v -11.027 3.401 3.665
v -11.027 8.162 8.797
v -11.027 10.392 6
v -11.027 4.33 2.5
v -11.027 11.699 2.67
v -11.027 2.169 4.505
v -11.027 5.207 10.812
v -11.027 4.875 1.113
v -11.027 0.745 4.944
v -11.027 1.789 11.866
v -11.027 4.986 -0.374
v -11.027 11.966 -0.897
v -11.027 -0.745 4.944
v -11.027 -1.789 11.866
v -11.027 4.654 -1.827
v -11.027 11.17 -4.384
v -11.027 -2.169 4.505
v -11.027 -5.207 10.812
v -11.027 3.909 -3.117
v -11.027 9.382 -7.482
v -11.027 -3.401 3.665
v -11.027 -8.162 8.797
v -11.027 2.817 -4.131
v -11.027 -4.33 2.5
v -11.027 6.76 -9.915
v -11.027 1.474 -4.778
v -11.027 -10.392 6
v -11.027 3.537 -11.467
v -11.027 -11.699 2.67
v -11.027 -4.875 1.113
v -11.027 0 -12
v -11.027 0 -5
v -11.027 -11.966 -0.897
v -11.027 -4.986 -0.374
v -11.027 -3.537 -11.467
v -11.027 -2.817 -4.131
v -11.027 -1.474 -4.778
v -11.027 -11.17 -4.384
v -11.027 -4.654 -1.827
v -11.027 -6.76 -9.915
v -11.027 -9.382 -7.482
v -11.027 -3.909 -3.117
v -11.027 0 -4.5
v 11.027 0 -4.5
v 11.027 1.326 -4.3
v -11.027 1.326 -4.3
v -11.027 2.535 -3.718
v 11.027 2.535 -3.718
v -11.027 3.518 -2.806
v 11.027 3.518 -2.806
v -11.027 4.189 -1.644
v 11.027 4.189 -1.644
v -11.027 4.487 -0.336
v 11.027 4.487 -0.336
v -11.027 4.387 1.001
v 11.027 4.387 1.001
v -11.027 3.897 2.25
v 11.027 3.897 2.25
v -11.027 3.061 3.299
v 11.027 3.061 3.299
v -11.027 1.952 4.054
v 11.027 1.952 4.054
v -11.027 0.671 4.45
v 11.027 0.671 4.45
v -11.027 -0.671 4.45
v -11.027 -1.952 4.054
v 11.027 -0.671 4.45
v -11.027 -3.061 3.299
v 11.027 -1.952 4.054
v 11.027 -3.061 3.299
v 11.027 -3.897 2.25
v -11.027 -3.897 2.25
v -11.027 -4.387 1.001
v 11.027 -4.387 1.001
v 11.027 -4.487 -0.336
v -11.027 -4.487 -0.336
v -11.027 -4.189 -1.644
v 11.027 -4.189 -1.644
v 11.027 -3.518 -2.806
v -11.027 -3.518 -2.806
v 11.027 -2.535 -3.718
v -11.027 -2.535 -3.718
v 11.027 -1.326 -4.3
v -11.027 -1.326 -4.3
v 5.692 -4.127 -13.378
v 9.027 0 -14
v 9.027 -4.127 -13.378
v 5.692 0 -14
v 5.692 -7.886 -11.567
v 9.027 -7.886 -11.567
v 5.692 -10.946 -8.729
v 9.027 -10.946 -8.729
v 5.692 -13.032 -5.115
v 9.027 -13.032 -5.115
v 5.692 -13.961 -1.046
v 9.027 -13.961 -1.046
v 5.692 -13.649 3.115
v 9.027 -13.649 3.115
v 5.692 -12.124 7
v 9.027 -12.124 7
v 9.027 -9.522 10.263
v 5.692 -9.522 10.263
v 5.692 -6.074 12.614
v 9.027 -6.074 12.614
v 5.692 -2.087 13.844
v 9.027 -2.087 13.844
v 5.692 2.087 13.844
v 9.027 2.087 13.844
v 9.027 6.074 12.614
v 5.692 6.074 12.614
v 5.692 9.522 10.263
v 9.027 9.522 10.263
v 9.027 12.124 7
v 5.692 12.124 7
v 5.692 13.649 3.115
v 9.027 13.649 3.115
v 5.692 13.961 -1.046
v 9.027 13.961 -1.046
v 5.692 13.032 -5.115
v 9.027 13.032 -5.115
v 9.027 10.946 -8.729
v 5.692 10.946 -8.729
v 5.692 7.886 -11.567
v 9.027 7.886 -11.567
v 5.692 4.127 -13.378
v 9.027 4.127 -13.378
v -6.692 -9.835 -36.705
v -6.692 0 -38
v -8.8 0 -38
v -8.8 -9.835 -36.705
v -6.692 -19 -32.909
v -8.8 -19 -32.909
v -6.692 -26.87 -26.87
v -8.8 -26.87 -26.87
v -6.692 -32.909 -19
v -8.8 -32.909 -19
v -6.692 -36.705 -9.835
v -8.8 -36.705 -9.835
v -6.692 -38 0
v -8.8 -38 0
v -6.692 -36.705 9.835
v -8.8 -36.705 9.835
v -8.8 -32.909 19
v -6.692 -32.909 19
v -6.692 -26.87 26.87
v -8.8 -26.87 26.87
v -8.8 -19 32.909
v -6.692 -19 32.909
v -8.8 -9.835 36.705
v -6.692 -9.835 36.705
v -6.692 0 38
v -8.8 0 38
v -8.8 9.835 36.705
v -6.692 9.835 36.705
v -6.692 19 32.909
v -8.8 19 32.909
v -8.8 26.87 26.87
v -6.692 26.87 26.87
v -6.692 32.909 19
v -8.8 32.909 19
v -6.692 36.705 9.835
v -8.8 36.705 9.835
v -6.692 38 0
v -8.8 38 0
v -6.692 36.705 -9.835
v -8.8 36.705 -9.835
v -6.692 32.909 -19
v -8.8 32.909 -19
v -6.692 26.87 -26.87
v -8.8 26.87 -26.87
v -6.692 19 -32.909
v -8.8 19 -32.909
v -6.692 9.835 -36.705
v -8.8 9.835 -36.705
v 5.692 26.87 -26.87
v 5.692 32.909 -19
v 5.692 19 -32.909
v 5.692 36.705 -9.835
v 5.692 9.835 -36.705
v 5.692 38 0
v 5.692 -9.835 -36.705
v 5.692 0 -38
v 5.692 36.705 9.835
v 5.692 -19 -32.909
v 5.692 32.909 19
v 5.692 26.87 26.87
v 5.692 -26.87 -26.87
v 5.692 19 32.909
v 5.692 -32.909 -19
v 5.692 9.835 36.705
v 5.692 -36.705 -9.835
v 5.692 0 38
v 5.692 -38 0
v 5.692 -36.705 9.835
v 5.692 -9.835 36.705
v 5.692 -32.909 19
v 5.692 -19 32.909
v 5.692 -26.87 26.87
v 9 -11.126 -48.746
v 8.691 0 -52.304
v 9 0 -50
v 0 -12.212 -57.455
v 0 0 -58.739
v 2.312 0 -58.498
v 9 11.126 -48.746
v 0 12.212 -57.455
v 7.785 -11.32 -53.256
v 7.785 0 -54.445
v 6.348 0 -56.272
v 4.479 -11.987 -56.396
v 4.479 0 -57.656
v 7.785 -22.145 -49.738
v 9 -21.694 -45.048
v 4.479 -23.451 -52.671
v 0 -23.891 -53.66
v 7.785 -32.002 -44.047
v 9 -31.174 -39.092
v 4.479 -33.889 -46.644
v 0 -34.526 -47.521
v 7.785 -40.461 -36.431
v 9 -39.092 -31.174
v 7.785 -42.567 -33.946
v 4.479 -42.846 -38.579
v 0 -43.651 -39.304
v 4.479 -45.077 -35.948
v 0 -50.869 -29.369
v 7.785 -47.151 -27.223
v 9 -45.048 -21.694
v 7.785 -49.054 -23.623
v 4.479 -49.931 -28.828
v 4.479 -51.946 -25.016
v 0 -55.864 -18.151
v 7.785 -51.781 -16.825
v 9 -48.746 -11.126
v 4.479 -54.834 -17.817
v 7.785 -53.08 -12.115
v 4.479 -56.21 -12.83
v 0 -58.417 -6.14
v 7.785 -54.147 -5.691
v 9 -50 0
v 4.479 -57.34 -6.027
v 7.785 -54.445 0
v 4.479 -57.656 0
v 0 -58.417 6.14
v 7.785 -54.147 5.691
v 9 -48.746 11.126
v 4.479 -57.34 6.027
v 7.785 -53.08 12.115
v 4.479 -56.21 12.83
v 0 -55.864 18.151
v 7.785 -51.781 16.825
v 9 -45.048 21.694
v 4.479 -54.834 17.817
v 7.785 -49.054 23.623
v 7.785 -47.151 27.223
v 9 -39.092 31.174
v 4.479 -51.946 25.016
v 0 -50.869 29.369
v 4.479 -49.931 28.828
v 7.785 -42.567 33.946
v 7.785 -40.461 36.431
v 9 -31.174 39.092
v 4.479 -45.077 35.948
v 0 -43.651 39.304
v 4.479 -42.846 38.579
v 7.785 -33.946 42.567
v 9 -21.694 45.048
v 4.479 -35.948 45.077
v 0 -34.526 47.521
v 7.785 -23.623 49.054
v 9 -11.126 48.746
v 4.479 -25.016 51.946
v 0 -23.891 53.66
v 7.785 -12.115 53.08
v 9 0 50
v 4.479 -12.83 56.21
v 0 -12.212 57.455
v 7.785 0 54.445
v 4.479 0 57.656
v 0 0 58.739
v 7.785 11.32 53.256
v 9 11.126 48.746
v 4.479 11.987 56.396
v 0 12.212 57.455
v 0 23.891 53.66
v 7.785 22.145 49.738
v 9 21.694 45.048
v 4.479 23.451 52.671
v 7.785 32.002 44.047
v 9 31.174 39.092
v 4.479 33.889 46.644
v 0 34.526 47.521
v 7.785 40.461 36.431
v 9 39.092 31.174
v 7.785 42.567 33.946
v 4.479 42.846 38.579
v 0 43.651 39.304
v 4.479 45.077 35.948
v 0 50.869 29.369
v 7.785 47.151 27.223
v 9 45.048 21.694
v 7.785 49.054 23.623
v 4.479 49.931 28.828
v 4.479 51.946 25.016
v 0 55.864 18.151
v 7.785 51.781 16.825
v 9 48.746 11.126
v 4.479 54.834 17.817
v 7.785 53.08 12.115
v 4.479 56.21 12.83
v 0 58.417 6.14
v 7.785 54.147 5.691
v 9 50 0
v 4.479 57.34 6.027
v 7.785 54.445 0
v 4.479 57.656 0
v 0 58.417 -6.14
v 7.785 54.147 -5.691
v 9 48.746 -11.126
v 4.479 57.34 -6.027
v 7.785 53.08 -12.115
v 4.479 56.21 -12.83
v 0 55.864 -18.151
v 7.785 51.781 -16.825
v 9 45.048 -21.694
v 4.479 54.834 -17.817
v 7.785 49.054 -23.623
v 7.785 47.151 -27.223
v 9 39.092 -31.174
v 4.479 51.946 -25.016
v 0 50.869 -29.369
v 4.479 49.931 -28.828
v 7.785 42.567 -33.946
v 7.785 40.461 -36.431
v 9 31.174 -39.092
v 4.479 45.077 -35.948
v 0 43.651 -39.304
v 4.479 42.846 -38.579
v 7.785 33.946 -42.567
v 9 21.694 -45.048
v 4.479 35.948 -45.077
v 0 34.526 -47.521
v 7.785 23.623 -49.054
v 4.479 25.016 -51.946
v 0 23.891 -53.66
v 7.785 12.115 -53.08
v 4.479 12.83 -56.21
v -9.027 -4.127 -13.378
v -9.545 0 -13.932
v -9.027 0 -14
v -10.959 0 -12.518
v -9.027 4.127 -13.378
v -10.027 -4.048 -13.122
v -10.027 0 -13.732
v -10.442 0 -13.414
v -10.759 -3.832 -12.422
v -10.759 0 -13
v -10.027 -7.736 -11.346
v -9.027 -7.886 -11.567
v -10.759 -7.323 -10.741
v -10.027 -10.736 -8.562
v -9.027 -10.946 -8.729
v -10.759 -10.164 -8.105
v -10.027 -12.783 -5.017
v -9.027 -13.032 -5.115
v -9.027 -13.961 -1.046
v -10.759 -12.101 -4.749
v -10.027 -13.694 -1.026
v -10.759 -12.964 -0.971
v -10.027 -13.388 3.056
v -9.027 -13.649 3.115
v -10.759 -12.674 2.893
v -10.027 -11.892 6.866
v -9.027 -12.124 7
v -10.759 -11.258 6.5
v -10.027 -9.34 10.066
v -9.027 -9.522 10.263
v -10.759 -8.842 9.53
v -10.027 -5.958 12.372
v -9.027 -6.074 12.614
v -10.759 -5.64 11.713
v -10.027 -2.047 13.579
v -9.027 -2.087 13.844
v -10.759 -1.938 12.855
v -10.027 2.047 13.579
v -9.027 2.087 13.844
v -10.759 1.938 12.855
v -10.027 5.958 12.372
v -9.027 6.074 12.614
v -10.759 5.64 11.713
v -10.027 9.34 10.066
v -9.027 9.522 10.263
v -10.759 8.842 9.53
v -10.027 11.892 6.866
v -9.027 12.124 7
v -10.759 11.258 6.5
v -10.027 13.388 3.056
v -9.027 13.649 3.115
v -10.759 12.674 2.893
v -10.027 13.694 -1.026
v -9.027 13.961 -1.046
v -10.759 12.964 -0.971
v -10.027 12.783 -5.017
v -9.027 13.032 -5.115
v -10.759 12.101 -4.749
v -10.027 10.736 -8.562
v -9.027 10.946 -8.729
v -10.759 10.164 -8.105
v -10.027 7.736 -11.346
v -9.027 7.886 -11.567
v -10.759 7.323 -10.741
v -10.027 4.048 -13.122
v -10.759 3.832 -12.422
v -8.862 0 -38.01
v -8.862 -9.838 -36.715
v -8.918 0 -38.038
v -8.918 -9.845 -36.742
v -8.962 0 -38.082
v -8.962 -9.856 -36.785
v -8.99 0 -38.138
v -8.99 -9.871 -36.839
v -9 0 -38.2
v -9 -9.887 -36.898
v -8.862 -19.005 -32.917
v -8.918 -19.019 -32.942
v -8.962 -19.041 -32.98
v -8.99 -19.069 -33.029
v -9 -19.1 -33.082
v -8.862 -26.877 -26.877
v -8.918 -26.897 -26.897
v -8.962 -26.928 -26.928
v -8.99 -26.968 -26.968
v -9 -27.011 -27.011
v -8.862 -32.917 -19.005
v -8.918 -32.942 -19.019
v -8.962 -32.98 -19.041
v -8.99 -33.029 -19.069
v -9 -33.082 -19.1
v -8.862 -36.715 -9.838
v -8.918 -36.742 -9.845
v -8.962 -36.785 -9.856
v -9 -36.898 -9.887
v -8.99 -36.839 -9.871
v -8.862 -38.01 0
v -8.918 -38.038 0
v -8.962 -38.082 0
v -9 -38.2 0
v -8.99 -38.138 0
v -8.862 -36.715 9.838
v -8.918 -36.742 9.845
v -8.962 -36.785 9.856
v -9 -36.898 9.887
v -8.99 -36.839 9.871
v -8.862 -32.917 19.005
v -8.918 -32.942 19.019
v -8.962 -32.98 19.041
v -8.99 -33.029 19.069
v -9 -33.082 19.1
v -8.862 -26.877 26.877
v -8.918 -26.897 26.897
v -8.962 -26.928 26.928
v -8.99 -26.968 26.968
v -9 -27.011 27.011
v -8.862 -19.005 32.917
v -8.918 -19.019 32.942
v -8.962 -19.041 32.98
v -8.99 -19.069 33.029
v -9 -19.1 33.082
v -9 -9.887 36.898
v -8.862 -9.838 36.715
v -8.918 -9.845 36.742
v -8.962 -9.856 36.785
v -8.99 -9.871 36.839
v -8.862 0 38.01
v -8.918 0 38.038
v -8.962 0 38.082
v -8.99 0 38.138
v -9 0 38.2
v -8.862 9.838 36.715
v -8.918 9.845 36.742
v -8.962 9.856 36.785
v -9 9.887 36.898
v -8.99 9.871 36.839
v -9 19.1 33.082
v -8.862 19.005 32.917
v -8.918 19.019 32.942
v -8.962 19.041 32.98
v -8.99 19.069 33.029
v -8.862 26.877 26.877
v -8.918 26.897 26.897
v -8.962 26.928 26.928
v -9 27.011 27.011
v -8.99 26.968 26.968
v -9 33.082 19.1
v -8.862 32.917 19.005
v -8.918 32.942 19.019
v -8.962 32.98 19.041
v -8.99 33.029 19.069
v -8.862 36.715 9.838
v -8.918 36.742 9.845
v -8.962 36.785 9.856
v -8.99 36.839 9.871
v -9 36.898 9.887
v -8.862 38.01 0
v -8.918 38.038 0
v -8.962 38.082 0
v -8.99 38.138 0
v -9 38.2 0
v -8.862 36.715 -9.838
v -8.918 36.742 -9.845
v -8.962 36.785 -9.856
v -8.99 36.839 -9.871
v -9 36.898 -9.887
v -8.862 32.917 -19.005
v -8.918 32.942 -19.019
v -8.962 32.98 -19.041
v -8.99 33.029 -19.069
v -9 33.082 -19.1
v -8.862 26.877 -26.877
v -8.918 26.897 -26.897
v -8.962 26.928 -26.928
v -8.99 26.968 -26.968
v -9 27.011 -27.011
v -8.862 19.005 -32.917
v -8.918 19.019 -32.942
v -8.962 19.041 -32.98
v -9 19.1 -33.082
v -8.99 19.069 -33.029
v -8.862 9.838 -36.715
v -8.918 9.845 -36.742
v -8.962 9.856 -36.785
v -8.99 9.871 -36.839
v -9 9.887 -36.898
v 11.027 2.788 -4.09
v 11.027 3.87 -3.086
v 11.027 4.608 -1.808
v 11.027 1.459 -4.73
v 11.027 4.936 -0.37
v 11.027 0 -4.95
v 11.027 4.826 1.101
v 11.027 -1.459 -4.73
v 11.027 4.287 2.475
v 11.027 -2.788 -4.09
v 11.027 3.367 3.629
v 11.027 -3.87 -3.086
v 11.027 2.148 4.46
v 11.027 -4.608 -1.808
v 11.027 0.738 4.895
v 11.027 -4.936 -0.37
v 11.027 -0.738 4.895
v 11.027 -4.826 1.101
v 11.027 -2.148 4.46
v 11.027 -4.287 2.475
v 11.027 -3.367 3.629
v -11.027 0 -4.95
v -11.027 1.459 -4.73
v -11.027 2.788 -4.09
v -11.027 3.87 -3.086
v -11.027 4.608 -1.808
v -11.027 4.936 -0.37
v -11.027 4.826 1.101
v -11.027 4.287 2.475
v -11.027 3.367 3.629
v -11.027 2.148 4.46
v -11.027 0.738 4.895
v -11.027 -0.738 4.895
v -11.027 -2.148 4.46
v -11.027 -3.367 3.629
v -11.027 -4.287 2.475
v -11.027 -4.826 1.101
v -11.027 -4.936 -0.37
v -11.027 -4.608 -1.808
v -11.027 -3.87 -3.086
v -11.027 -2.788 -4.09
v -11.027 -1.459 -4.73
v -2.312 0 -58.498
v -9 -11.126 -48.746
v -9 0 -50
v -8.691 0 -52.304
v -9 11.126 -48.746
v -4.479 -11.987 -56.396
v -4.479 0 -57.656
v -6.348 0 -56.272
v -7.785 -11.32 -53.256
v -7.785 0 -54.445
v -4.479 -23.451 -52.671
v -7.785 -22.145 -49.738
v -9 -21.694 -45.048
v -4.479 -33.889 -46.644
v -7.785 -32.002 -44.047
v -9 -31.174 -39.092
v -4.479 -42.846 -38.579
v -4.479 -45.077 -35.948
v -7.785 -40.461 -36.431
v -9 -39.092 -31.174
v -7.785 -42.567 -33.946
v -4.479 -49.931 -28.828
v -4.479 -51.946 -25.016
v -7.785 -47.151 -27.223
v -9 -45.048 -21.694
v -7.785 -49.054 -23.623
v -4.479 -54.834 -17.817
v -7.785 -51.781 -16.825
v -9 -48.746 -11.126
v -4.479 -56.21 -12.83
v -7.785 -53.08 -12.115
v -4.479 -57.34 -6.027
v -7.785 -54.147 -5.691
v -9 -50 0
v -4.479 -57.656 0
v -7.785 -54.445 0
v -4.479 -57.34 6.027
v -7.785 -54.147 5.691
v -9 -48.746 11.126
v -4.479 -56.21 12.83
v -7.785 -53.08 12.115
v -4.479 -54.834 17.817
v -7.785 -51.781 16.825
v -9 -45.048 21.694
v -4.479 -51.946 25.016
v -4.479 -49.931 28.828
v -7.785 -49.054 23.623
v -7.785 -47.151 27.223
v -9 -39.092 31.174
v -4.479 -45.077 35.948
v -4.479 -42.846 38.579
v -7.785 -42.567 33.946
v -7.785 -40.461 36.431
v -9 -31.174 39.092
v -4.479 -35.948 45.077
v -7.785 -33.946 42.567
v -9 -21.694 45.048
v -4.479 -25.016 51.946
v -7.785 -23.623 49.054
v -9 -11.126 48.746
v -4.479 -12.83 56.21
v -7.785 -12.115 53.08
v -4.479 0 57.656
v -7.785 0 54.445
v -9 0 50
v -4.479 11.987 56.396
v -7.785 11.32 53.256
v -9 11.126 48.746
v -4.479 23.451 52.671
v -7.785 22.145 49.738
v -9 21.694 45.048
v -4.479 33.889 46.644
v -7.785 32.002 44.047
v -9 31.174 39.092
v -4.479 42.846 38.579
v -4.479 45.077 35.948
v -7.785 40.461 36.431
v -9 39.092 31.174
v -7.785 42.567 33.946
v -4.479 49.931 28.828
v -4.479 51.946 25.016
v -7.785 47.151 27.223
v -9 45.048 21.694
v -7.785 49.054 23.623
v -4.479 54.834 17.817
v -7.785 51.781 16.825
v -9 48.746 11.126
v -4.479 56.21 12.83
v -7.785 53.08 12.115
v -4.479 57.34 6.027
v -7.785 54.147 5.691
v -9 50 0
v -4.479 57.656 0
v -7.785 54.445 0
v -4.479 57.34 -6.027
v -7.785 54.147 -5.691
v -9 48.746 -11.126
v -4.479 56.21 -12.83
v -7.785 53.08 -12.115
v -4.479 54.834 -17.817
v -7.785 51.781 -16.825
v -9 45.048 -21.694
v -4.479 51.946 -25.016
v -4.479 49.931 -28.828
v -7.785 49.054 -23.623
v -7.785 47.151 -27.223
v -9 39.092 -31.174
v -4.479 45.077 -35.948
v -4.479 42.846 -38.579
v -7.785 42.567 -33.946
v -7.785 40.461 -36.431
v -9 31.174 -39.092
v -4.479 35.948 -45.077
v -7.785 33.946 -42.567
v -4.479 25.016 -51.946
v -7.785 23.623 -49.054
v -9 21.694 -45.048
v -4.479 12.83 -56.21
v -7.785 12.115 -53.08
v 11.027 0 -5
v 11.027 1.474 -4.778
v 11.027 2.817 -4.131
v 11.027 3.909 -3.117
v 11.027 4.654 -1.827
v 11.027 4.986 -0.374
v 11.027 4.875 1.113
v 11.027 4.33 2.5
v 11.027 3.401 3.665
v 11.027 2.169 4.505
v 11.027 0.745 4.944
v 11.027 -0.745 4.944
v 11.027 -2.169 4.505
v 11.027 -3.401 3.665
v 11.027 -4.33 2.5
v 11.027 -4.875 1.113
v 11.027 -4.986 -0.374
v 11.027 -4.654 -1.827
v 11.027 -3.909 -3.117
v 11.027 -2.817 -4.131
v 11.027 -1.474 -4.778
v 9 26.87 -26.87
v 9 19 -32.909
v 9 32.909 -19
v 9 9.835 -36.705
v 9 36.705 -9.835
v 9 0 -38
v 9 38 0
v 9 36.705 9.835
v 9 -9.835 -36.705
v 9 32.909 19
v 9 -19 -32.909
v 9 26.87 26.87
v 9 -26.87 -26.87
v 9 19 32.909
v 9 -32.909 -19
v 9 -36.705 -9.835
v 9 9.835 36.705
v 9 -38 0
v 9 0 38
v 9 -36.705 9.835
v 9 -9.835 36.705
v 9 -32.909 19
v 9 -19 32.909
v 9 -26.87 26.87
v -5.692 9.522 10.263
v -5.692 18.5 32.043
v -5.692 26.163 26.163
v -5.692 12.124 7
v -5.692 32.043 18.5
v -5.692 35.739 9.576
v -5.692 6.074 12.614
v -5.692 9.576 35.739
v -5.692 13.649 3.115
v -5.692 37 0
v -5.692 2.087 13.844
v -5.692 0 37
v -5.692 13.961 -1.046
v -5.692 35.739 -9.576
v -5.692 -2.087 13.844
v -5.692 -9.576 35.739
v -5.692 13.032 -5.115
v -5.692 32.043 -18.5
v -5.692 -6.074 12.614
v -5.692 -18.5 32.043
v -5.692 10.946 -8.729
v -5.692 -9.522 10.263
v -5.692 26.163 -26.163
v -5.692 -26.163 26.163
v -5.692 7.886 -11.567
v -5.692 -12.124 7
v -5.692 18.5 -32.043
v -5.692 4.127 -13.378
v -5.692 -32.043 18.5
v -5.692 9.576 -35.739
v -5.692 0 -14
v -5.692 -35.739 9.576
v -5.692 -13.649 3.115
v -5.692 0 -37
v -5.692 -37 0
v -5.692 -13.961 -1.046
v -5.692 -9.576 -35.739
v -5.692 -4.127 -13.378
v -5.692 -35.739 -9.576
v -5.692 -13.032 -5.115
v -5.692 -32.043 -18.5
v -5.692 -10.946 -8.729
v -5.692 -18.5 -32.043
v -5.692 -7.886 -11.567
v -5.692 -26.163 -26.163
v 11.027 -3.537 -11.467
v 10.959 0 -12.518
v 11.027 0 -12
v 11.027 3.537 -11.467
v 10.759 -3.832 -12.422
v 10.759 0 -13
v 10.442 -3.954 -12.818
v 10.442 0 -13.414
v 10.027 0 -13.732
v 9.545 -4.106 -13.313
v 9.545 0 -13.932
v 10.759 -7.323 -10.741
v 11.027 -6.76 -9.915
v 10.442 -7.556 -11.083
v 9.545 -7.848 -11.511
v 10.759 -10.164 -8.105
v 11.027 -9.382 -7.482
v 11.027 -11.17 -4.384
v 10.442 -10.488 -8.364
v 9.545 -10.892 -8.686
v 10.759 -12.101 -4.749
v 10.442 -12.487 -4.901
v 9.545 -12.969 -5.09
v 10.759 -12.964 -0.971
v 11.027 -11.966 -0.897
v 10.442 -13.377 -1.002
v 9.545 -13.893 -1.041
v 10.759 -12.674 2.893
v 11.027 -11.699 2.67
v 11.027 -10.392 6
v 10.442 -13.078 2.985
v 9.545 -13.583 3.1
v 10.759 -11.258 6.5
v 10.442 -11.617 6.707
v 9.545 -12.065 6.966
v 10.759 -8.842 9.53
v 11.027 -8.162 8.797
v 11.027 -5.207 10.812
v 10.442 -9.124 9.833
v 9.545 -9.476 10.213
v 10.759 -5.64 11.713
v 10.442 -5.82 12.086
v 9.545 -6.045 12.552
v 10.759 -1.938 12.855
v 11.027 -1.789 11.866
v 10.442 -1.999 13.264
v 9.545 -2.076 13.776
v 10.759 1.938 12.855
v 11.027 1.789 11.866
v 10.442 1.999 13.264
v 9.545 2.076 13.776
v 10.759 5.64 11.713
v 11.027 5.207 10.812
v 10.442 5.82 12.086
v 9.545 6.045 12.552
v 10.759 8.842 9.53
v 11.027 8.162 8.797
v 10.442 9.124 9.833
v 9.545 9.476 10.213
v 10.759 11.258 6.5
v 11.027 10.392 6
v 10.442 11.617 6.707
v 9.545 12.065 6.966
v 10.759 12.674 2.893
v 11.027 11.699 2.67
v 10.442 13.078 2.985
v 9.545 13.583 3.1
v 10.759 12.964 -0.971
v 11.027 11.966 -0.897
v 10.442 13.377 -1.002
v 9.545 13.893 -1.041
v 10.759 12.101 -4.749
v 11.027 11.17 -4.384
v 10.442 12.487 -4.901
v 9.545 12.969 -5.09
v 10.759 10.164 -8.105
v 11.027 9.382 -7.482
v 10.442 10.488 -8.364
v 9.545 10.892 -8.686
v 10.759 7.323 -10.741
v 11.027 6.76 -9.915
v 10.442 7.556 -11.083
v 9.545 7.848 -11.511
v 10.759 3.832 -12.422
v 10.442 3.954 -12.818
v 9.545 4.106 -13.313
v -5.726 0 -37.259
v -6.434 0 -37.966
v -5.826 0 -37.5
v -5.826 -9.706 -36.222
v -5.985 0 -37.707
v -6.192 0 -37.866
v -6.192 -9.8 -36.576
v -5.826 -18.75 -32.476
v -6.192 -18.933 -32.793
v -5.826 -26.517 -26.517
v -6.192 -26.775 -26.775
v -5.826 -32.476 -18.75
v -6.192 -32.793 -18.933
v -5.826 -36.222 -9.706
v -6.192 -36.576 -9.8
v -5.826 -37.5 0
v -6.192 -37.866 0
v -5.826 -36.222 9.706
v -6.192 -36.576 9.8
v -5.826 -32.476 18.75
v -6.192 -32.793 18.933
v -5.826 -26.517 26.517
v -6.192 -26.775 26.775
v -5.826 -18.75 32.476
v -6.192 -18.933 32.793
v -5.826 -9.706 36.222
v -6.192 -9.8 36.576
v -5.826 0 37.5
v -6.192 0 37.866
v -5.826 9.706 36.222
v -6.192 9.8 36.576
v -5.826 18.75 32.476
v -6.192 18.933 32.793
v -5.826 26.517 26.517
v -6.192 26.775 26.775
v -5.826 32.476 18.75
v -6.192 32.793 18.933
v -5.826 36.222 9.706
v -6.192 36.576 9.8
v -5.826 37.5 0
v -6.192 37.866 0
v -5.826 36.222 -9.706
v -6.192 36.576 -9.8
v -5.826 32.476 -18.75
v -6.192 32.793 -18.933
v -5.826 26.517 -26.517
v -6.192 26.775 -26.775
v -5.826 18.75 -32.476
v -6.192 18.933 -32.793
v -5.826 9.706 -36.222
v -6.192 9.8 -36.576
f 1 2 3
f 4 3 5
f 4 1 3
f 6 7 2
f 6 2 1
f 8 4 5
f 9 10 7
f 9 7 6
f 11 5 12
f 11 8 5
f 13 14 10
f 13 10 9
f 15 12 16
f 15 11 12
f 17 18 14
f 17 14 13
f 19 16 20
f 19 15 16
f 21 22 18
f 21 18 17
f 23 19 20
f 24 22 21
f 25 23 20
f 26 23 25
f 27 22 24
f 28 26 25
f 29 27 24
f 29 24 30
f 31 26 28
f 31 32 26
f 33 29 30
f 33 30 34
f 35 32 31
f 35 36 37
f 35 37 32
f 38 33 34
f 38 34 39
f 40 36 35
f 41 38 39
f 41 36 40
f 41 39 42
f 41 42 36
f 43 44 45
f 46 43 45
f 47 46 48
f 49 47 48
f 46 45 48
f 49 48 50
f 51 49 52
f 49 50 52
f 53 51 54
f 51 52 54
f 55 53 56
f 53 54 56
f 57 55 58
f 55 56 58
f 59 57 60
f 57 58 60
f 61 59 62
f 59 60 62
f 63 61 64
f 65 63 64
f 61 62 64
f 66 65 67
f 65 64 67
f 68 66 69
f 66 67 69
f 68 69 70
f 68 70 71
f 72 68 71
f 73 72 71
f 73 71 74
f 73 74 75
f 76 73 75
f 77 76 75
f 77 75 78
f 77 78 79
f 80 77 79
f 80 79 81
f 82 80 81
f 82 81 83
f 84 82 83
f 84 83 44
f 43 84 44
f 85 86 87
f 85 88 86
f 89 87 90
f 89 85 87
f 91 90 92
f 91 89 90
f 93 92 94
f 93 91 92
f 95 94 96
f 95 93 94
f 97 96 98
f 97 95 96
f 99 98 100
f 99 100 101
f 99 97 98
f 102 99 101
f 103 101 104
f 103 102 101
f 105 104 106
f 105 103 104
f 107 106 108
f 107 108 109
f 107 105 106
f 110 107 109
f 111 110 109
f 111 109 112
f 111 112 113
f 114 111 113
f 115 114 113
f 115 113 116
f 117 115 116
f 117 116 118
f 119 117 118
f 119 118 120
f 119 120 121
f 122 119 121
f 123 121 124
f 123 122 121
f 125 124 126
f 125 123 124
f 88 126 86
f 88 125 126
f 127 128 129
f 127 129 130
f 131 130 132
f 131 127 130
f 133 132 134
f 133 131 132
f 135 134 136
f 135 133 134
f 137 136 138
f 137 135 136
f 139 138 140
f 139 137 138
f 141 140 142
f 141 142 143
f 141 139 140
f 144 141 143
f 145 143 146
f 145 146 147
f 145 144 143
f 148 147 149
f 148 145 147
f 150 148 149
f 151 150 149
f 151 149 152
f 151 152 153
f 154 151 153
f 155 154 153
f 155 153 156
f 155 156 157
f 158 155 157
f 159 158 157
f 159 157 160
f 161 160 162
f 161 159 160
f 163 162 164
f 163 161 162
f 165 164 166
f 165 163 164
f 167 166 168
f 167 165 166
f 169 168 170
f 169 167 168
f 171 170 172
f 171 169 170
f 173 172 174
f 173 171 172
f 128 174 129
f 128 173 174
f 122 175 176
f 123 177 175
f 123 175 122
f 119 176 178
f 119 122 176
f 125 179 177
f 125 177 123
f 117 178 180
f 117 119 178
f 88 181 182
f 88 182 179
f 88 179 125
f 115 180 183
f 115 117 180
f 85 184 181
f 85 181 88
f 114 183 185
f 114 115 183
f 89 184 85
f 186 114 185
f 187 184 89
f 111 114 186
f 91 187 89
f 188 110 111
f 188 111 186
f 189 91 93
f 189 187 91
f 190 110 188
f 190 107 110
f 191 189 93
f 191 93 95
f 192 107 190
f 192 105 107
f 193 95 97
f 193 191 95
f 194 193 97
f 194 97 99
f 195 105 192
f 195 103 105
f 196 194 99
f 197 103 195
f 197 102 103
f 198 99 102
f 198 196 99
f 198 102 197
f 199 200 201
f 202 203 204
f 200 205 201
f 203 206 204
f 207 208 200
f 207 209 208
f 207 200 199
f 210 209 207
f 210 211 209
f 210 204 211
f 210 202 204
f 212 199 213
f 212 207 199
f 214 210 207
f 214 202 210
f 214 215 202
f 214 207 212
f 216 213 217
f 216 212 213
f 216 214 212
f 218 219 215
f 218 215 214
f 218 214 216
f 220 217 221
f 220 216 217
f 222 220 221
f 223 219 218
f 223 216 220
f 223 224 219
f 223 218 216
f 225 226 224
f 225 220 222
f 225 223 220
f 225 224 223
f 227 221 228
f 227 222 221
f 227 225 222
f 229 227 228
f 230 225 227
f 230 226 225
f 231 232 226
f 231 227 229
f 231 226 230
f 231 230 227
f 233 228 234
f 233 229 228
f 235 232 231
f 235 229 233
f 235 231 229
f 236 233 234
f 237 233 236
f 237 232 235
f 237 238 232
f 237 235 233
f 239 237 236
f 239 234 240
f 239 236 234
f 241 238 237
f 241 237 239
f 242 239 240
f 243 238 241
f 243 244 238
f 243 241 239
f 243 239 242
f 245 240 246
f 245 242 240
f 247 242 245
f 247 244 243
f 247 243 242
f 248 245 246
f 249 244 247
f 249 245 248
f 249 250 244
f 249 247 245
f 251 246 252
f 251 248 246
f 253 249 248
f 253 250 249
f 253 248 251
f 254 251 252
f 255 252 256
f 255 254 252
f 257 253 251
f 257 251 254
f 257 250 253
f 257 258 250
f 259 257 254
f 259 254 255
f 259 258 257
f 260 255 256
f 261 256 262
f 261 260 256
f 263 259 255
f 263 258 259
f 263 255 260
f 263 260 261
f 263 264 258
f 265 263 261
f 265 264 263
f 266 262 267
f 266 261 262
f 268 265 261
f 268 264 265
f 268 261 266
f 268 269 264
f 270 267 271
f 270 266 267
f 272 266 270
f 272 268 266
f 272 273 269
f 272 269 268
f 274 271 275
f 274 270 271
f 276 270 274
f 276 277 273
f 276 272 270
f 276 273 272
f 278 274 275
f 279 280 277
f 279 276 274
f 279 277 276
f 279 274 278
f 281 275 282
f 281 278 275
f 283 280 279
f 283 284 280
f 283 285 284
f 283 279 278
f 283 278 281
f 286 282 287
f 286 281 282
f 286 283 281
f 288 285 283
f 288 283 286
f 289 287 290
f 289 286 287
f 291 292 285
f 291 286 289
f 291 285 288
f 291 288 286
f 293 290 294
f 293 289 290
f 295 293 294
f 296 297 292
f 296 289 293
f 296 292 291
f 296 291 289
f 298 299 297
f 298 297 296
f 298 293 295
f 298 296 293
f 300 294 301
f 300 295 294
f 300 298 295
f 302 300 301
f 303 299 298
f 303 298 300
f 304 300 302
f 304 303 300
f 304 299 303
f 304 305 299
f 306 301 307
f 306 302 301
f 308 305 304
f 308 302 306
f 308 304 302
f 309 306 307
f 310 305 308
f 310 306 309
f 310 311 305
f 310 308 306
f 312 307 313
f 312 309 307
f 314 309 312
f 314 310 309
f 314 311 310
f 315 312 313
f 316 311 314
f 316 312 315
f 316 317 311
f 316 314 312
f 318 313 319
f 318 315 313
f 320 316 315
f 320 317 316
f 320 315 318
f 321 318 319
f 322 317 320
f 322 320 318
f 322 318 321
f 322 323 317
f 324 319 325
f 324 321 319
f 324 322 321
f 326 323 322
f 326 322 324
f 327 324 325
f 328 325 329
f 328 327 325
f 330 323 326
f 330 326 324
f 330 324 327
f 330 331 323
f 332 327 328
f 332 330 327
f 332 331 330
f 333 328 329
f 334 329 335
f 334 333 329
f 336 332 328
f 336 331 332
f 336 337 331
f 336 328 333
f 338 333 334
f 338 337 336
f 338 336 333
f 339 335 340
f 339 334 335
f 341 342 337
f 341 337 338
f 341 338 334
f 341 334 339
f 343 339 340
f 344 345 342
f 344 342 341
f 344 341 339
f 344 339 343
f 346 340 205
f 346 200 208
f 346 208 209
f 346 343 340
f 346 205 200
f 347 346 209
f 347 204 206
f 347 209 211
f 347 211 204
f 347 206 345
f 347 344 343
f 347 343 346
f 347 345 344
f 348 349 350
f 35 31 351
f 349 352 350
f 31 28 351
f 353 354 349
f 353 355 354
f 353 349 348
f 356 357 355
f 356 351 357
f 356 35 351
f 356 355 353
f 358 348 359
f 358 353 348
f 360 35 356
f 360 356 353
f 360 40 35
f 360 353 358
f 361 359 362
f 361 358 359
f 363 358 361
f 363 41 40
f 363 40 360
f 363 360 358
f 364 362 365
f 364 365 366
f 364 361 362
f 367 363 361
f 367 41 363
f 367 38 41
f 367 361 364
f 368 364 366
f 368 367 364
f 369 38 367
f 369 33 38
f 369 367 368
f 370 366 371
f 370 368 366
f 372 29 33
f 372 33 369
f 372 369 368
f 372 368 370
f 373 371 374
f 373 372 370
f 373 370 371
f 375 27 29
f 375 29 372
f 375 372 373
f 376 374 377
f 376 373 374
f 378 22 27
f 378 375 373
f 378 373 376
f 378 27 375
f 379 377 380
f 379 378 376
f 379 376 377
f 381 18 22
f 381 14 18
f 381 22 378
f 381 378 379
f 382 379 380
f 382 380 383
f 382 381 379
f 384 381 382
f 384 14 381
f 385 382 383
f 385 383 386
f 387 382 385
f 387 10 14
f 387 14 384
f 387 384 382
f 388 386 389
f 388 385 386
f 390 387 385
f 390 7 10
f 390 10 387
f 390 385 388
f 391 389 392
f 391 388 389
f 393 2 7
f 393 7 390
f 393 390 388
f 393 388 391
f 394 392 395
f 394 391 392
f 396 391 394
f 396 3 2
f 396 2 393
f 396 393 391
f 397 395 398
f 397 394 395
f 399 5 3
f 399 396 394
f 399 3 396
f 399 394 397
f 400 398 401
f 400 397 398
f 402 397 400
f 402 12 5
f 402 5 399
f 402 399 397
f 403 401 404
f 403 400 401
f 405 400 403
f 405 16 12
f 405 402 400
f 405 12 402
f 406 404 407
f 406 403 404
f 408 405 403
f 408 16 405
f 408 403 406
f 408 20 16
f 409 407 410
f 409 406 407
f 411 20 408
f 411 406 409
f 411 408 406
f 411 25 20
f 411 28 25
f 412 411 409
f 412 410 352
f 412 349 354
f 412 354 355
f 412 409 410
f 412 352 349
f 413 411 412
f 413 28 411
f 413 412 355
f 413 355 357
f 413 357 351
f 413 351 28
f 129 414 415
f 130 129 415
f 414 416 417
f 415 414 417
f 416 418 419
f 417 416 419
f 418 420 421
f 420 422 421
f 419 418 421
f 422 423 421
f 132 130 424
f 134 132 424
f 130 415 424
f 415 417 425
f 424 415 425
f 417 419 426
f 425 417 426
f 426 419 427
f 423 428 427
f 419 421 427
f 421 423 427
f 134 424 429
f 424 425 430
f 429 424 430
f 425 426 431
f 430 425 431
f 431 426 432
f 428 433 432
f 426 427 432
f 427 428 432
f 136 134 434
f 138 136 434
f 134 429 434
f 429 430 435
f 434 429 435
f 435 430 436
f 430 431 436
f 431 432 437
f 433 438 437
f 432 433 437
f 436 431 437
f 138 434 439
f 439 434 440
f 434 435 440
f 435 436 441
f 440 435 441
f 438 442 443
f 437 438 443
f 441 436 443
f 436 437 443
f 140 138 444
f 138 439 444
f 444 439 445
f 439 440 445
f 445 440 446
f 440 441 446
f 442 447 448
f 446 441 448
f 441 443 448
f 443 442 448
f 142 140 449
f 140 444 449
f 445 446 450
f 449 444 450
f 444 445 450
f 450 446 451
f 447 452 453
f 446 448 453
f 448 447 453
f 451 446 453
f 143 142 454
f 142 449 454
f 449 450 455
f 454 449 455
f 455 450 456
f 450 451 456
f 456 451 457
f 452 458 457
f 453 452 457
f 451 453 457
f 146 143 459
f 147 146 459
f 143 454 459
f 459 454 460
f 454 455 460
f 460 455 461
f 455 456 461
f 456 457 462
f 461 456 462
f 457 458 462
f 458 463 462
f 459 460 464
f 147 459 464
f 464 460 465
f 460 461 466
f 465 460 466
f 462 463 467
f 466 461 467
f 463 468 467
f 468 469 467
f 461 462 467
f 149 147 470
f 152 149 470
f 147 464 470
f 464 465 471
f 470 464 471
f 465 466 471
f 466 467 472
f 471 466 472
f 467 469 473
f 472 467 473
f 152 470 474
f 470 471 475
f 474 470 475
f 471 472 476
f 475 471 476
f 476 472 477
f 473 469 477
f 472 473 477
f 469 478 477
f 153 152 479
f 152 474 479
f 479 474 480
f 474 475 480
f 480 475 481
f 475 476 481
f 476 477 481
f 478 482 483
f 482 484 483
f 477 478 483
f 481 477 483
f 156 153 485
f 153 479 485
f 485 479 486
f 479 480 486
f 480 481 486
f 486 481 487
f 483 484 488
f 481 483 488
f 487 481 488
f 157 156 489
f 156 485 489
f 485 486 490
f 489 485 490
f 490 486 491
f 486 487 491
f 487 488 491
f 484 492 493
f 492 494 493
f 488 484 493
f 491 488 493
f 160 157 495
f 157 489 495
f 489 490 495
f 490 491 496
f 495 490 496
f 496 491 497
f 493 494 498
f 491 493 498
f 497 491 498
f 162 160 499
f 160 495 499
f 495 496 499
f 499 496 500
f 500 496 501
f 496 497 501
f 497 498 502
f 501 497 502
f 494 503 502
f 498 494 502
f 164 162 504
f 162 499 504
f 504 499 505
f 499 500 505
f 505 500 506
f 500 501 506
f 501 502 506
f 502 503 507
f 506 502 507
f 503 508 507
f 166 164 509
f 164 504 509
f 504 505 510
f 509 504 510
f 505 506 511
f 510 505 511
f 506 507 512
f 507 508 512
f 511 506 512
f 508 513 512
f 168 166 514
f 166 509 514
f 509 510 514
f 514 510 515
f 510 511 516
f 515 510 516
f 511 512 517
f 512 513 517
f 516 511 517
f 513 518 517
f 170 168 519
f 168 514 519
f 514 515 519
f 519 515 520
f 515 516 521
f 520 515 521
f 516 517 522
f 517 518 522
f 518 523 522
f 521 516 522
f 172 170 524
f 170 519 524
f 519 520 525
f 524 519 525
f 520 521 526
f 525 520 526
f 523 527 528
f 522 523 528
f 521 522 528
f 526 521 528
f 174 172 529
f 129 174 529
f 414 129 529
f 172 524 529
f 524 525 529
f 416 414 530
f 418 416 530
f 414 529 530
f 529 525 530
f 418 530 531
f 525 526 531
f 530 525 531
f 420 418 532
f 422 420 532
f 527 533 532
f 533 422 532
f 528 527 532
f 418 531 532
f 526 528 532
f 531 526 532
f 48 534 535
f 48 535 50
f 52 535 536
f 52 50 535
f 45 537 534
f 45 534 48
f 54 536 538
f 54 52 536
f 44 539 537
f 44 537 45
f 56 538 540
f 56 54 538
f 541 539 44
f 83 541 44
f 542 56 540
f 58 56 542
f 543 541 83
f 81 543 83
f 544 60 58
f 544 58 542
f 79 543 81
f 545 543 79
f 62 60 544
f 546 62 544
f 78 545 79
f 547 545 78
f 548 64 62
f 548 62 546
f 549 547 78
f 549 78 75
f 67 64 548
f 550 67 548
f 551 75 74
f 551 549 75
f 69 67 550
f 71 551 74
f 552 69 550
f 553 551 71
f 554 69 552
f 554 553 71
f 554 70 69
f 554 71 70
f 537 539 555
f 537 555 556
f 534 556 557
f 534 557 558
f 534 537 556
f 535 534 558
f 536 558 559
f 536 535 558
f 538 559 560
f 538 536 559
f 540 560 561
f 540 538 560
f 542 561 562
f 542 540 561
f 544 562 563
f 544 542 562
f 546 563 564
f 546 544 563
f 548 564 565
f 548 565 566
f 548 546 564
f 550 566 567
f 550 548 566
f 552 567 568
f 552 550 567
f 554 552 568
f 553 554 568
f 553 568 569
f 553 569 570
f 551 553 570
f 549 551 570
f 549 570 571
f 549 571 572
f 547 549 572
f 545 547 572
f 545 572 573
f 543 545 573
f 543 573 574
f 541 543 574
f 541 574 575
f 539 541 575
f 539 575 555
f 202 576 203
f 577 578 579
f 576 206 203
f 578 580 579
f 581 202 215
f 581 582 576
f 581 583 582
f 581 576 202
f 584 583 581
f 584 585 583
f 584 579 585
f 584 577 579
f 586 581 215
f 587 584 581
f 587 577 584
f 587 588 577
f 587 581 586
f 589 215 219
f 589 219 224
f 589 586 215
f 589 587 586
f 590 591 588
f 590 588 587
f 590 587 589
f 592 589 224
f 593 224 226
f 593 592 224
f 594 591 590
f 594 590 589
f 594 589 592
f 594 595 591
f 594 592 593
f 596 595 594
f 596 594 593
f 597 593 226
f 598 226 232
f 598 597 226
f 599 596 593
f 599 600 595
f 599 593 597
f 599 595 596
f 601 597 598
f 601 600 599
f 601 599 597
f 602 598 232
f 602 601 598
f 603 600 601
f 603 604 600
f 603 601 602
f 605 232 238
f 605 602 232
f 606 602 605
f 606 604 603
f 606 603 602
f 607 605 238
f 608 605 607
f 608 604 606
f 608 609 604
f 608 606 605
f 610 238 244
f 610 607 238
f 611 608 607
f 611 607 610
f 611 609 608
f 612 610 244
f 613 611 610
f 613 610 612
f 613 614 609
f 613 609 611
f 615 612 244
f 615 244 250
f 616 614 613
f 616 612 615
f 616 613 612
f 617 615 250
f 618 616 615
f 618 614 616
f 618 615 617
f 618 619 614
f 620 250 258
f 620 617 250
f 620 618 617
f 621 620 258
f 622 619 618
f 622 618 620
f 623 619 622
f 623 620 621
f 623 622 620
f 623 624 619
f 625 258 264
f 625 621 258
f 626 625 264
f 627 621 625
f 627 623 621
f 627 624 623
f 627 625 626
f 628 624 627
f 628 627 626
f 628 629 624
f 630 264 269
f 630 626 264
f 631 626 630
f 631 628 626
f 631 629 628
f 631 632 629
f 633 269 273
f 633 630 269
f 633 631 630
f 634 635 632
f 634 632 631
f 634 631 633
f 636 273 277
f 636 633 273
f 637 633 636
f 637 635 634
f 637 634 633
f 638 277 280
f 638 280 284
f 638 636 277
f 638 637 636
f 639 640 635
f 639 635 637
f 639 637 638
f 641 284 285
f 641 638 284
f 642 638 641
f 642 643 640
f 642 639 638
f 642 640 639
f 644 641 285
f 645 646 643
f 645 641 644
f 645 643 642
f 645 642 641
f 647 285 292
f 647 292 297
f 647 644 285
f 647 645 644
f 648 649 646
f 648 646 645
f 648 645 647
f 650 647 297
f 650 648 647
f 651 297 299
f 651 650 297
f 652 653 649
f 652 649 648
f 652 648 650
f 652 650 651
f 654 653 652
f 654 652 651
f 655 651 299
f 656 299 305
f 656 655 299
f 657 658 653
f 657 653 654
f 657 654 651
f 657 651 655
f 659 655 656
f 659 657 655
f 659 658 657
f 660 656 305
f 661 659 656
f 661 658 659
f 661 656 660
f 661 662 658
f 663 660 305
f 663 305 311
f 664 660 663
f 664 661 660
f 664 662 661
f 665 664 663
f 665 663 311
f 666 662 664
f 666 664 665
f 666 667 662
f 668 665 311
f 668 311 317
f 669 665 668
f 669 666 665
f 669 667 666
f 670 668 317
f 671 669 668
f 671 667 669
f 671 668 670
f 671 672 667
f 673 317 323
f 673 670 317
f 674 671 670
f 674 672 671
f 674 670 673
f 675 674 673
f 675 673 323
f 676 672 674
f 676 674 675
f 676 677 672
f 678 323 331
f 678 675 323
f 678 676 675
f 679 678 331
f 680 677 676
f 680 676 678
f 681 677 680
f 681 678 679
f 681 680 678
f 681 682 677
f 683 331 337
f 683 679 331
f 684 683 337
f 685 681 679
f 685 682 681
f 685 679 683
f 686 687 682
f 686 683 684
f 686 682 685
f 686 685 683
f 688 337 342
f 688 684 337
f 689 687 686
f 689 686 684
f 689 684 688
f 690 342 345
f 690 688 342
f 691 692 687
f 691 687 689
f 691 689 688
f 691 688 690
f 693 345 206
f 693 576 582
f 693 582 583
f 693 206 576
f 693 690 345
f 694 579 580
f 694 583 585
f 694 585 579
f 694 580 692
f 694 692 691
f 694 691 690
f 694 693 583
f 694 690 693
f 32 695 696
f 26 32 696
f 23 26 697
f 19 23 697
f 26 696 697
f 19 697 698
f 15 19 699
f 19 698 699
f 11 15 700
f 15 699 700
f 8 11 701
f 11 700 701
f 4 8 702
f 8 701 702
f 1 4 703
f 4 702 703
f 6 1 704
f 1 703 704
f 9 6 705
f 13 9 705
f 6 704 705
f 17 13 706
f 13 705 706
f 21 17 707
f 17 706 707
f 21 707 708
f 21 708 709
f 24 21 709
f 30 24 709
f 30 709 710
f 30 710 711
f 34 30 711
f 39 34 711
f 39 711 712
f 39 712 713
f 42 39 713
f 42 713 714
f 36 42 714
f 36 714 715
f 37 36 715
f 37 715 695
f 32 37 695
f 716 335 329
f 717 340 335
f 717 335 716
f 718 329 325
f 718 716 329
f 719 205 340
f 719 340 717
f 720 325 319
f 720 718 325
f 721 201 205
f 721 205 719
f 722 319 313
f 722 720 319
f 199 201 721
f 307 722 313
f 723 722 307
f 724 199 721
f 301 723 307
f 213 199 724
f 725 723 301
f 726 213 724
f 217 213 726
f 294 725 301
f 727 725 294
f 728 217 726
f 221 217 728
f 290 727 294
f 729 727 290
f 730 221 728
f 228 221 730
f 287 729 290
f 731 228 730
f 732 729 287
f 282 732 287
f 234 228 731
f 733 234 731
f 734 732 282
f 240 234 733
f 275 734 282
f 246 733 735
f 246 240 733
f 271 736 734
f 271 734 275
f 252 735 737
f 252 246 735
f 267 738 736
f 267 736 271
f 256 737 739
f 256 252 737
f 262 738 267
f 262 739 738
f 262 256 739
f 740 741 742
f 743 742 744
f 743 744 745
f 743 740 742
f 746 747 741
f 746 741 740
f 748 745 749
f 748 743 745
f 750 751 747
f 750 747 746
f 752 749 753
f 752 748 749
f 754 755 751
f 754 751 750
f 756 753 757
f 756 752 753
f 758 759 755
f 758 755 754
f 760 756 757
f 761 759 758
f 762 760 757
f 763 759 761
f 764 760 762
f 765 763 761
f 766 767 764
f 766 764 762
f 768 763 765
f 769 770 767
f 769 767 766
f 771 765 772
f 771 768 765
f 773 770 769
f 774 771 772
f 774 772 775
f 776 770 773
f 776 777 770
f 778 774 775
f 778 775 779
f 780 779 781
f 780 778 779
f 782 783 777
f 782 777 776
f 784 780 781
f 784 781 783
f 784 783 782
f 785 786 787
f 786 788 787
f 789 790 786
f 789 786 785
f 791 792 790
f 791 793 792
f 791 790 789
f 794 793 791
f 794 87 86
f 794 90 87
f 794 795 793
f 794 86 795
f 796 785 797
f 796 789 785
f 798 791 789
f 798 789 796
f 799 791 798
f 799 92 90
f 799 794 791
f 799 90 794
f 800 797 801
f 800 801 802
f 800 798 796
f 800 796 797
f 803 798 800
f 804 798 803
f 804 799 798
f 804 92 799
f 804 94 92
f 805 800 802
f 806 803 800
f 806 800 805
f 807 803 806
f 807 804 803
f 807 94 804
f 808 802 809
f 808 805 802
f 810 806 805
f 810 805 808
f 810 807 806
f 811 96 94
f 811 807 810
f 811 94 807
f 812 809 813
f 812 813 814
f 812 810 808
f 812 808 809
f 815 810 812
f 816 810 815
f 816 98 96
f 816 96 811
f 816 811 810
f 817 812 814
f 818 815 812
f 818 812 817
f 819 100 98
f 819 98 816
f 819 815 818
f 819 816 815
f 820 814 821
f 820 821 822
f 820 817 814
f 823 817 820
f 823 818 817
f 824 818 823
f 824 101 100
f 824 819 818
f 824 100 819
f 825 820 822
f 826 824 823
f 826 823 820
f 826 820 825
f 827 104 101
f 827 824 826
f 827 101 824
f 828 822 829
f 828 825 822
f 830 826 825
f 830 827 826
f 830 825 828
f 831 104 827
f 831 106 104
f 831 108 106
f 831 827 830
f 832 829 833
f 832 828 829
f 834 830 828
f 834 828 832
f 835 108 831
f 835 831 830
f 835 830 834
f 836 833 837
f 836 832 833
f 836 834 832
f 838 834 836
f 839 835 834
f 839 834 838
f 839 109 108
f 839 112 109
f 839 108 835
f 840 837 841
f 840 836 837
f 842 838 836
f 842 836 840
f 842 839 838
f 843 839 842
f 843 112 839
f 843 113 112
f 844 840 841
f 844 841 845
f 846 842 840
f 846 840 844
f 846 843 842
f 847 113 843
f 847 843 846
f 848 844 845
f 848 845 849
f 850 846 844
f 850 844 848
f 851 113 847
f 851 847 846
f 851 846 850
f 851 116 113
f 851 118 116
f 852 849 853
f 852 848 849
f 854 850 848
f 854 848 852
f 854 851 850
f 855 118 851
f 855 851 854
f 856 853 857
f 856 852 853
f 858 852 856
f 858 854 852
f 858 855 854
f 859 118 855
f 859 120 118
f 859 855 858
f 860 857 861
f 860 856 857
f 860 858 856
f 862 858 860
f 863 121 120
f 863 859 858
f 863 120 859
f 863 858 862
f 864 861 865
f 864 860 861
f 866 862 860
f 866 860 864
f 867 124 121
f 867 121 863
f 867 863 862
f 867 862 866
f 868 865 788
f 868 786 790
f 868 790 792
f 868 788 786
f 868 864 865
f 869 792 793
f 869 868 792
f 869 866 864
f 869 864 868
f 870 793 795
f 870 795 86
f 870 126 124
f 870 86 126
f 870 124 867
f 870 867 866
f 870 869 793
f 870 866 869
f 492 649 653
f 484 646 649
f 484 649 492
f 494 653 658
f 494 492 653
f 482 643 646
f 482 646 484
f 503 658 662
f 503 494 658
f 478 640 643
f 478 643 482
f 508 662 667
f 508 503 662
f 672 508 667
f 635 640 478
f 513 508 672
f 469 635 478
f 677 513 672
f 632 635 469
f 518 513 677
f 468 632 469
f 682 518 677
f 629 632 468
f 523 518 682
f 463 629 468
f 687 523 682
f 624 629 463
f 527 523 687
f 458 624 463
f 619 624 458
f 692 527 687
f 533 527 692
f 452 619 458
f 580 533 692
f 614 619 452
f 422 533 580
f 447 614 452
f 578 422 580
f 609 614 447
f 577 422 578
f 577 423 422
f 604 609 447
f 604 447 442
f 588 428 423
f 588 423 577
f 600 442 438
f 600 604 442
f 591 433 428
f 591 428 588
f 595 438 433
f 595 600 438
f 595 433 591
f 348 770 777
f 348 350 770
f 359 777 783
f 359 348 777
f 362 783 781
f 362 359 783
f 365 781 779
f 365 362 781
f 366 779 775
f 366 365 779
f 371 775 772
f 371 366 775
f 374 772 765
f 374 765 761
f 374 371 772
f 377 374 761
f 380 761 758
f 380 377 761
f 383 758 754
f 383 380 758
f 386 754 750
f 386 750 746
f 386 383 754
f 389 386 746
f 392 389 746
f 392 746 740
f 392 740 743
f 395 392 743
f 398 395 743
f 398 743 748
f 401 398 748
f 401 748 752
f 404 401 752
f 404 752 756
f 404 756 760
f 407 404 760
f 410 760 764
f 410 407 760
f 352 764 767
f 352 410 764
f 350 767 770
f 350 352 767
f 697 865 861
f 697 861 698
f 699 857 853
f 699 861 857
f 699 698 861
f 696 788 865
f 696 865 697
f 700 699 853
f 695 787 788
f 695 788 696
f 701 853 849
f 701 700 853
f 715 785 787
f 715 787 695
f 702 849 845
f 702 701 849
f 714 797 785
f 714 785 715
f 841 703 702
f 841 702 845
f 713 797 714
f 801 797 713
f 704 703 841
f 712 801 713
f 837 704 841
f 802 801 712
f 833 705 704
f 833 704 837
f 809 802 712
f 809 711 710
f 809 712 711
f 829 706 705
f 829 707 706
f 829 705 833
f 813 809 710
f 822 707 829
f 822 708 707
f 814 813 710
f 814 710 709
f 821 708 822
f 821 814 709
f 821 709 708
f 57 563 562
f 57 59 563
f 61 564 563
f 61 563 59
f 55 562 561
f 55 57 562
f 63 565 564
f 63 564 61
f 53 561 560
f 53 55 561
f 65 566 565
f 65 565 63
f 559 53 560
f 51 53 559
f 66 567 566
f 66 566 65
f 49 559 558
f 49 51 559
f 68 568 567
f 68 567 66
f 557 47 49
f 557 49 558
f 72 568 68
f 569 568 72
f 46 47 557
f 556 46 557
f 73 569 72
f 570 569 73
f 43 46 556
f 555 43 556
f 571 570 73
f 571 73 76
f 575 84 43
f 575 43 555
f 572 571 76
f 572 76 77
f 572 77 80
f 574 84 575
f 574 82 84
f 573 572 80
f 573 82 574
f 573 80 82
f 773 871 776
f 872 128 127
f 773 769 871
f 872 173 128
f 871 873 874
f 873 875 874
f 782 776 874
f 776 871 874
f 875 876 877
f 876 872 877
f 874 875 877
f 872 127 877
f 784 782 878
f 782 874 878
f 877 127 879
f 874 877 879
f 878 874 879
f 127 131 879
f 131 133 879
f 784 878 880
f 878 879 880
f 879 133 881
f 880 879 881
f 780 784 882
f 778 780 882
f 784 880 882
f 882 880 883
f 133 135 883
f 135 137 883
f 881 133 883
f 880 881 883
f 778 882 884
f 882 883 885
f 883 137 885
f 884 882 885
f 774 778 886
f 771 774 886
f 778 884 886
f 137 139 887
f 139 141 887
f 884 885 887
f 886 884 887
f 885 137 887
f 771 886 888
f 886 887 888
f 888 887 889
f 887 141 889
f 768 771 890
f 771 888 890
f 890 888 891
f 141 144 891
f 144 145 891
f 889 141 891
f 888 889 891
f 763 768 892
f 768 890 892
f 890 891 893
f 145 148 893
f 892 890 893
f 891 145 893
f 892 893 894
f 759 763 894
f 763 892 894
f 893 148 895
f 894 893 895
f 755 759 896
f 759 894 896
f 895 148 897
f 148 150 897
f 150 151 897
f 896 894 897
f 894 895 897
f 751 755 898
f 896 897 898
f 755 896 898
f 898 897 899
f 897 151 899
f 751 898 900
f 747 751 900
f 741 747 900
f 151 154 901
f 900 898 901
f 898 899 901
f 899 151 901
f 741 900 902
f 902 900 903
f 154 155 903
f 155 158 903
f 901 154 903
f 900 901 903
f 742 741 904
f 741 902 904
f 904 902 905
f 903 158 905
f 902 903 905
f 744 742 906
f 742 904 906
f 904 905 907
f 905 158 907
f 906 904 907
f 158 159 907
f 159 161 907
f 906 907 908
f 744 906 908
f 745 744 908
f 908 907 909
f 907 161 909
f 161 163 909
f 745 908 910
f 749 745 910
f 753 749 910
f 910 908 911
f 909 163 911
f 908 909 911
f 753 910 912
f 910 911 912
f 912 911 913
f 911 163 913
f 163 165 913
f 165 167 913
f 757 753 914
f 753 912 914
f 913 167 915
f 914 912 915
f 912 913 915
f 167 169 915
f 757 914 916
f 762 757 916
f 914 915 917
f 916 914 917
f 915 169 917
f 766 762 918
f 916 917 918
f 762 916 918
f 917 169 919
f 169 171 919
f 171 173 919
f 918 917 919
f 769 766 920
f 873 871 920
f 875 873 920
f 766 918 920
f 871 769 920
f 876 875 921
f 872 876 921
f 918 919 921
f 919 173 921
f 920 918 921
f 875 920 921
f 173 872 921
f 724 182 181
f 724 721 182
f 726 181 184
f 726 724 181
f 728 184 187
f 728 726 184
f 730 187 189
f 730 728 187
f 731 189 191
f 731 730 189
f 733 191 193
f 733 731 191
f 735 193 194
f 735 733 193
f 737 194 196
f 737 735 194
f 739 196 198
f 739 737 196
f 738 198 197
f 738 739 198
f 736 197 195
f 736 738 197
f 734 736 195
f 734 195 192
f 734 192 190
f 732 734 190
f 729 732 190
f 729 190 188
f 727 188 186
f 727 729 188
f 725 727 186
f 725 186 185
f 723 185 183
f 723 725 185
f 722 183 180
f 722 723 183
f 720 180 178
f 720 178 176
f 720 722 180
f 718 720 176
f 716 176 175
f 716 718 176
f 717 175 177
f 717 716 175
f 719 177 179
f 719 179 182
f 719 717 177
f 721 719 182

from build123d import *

# Parameters (mm, degrees)
SKETCH3_R          = 5
SKETCH3_R_2        = 4.95
SKETCH3_R_3        = 4.5
CUT_EXTRUDE1_DEPTH = 86.951980751
FILLET1_R          = 1
FILLET2_R          = 0.2


with BuildPart() as part:
    # Sketch2 → Revolve1 (revolve)
    with BuildSketch(Plane.XY, mode=Mode.PRIVATE) as revolve1_sk:
        with BuildLine():
            Line((-11.027307991, 12), (-11.027307991, 0))
            Line((-11.027307991, 0), (0, 0))
            Line((0, 0), (0, 58.738594233))
            ThreePointArc((0, 58.738594233), (-6.347653376, 56.272221081), (-9, 50))
            Line((-9, 50), (-9, 38))
            Line((-9, 38), (-5.692350932, 38))
            Line((-5.692350932, 38), (-5.692350932, 35.792500491))
            Line((-5.692350932, 35.792500491), (-5.692350932, 14))
            Line((-5.692350932, 14), (-9.027307991, 14))
            ThreePointArc((-9.027307991, 14), (-10.441521553, 13.414213562), (-11.027307991, 12))
        make_face()
        with BuildLine():
            Line((0, 58.738594233), (0, 0))
            Line((0, 0), (11.027307991, 0))
            Line((11.027307991, 0), (11.027307991, 12))
            ThreePointArc((11.027307991, 12), (10.441521553, 13.414213562), (9.027307991, 14))
            Line((9.027307991, 14), (5.692350932, 14))
            Line((5.692350932, 14), (5.692350932, 35.792500491))
            Line((5.692350932, 35.792500491), (5.692350932, 38))
            Line((5.692350932, 38), (9, 38))
            Line((9, 38), (9, 50))
            ThreePointArc((9, 50), (6.347653376, 56.272221081), (0, 58.738594233))
        make_face()
    revolve(revolve1_sk.sketch.rotate(Axis((0, 0, 0), (-1, 0, 0)), 90), axis=Axis((0, 0, 0), (-1, 0, 0)))

    # Sketch3 → Cut-Extrude1 (cut, through all)
    # profile 1 of 2: a face of its own
    with BuildSketch(Plane(origin=(11.027307991, 0, 0), x_dir=(0, 0, -1), z_dir=(1, 0, 0))):
        Circle(SKETCH3_R)
        Circle(SKETCH3_R_2, mode=Mode.SUBTRACT)
    # profile 2 of 2: a face of its own
    with BuildSketch(Plane(origin=(11.027307991, 0, 0), x_dir=(0, 0, -1), z_dir=(1, 0, 0))):
        Circle(SKETCH3_R_3)
    extrude(amount=-CUT_EXTRUDE1_DEPTH, mode=Mode.SUBTRACT)


with BuildPart() as cut_extrude1_piece_1:
    # of the separate pieces the step leaves, piece 1, a body of its own (cut_extrude1_pieces)
    add(part.part.solids().sort_by_distance((-11.027307991, 0, -12))[0])

    # Fillet1
    fillet1_edges = [cut_extrude1_piece_1.edges().sort_by_distance(p)[0] for p in [
        (-5.692350932, 0, 38),
    ]]
    fillet(fillet1_edges, radius=FILLET1_R)

    # Fillet2
    fillet2_edges = [cut_extrude1_piece_1.edges().sort_by_distance(p)[0] for p in [
        (-9, 0, 38),
    ]]
    fillet(fillet2_edges, radius=FILLET2_R)


with BuildPart() as cut_extrude1_piece_2:
    # of the separate pieces the step leaves, piece 2, a body of its own (cut_extrude1_pieces)
    add(part.part.solids().sort_by_distance((-11.027307991, 0, -4.95))[0])


solid = Compound([cut_extrude1_piece_1.part, cut_extrude1_piece_2.part])
